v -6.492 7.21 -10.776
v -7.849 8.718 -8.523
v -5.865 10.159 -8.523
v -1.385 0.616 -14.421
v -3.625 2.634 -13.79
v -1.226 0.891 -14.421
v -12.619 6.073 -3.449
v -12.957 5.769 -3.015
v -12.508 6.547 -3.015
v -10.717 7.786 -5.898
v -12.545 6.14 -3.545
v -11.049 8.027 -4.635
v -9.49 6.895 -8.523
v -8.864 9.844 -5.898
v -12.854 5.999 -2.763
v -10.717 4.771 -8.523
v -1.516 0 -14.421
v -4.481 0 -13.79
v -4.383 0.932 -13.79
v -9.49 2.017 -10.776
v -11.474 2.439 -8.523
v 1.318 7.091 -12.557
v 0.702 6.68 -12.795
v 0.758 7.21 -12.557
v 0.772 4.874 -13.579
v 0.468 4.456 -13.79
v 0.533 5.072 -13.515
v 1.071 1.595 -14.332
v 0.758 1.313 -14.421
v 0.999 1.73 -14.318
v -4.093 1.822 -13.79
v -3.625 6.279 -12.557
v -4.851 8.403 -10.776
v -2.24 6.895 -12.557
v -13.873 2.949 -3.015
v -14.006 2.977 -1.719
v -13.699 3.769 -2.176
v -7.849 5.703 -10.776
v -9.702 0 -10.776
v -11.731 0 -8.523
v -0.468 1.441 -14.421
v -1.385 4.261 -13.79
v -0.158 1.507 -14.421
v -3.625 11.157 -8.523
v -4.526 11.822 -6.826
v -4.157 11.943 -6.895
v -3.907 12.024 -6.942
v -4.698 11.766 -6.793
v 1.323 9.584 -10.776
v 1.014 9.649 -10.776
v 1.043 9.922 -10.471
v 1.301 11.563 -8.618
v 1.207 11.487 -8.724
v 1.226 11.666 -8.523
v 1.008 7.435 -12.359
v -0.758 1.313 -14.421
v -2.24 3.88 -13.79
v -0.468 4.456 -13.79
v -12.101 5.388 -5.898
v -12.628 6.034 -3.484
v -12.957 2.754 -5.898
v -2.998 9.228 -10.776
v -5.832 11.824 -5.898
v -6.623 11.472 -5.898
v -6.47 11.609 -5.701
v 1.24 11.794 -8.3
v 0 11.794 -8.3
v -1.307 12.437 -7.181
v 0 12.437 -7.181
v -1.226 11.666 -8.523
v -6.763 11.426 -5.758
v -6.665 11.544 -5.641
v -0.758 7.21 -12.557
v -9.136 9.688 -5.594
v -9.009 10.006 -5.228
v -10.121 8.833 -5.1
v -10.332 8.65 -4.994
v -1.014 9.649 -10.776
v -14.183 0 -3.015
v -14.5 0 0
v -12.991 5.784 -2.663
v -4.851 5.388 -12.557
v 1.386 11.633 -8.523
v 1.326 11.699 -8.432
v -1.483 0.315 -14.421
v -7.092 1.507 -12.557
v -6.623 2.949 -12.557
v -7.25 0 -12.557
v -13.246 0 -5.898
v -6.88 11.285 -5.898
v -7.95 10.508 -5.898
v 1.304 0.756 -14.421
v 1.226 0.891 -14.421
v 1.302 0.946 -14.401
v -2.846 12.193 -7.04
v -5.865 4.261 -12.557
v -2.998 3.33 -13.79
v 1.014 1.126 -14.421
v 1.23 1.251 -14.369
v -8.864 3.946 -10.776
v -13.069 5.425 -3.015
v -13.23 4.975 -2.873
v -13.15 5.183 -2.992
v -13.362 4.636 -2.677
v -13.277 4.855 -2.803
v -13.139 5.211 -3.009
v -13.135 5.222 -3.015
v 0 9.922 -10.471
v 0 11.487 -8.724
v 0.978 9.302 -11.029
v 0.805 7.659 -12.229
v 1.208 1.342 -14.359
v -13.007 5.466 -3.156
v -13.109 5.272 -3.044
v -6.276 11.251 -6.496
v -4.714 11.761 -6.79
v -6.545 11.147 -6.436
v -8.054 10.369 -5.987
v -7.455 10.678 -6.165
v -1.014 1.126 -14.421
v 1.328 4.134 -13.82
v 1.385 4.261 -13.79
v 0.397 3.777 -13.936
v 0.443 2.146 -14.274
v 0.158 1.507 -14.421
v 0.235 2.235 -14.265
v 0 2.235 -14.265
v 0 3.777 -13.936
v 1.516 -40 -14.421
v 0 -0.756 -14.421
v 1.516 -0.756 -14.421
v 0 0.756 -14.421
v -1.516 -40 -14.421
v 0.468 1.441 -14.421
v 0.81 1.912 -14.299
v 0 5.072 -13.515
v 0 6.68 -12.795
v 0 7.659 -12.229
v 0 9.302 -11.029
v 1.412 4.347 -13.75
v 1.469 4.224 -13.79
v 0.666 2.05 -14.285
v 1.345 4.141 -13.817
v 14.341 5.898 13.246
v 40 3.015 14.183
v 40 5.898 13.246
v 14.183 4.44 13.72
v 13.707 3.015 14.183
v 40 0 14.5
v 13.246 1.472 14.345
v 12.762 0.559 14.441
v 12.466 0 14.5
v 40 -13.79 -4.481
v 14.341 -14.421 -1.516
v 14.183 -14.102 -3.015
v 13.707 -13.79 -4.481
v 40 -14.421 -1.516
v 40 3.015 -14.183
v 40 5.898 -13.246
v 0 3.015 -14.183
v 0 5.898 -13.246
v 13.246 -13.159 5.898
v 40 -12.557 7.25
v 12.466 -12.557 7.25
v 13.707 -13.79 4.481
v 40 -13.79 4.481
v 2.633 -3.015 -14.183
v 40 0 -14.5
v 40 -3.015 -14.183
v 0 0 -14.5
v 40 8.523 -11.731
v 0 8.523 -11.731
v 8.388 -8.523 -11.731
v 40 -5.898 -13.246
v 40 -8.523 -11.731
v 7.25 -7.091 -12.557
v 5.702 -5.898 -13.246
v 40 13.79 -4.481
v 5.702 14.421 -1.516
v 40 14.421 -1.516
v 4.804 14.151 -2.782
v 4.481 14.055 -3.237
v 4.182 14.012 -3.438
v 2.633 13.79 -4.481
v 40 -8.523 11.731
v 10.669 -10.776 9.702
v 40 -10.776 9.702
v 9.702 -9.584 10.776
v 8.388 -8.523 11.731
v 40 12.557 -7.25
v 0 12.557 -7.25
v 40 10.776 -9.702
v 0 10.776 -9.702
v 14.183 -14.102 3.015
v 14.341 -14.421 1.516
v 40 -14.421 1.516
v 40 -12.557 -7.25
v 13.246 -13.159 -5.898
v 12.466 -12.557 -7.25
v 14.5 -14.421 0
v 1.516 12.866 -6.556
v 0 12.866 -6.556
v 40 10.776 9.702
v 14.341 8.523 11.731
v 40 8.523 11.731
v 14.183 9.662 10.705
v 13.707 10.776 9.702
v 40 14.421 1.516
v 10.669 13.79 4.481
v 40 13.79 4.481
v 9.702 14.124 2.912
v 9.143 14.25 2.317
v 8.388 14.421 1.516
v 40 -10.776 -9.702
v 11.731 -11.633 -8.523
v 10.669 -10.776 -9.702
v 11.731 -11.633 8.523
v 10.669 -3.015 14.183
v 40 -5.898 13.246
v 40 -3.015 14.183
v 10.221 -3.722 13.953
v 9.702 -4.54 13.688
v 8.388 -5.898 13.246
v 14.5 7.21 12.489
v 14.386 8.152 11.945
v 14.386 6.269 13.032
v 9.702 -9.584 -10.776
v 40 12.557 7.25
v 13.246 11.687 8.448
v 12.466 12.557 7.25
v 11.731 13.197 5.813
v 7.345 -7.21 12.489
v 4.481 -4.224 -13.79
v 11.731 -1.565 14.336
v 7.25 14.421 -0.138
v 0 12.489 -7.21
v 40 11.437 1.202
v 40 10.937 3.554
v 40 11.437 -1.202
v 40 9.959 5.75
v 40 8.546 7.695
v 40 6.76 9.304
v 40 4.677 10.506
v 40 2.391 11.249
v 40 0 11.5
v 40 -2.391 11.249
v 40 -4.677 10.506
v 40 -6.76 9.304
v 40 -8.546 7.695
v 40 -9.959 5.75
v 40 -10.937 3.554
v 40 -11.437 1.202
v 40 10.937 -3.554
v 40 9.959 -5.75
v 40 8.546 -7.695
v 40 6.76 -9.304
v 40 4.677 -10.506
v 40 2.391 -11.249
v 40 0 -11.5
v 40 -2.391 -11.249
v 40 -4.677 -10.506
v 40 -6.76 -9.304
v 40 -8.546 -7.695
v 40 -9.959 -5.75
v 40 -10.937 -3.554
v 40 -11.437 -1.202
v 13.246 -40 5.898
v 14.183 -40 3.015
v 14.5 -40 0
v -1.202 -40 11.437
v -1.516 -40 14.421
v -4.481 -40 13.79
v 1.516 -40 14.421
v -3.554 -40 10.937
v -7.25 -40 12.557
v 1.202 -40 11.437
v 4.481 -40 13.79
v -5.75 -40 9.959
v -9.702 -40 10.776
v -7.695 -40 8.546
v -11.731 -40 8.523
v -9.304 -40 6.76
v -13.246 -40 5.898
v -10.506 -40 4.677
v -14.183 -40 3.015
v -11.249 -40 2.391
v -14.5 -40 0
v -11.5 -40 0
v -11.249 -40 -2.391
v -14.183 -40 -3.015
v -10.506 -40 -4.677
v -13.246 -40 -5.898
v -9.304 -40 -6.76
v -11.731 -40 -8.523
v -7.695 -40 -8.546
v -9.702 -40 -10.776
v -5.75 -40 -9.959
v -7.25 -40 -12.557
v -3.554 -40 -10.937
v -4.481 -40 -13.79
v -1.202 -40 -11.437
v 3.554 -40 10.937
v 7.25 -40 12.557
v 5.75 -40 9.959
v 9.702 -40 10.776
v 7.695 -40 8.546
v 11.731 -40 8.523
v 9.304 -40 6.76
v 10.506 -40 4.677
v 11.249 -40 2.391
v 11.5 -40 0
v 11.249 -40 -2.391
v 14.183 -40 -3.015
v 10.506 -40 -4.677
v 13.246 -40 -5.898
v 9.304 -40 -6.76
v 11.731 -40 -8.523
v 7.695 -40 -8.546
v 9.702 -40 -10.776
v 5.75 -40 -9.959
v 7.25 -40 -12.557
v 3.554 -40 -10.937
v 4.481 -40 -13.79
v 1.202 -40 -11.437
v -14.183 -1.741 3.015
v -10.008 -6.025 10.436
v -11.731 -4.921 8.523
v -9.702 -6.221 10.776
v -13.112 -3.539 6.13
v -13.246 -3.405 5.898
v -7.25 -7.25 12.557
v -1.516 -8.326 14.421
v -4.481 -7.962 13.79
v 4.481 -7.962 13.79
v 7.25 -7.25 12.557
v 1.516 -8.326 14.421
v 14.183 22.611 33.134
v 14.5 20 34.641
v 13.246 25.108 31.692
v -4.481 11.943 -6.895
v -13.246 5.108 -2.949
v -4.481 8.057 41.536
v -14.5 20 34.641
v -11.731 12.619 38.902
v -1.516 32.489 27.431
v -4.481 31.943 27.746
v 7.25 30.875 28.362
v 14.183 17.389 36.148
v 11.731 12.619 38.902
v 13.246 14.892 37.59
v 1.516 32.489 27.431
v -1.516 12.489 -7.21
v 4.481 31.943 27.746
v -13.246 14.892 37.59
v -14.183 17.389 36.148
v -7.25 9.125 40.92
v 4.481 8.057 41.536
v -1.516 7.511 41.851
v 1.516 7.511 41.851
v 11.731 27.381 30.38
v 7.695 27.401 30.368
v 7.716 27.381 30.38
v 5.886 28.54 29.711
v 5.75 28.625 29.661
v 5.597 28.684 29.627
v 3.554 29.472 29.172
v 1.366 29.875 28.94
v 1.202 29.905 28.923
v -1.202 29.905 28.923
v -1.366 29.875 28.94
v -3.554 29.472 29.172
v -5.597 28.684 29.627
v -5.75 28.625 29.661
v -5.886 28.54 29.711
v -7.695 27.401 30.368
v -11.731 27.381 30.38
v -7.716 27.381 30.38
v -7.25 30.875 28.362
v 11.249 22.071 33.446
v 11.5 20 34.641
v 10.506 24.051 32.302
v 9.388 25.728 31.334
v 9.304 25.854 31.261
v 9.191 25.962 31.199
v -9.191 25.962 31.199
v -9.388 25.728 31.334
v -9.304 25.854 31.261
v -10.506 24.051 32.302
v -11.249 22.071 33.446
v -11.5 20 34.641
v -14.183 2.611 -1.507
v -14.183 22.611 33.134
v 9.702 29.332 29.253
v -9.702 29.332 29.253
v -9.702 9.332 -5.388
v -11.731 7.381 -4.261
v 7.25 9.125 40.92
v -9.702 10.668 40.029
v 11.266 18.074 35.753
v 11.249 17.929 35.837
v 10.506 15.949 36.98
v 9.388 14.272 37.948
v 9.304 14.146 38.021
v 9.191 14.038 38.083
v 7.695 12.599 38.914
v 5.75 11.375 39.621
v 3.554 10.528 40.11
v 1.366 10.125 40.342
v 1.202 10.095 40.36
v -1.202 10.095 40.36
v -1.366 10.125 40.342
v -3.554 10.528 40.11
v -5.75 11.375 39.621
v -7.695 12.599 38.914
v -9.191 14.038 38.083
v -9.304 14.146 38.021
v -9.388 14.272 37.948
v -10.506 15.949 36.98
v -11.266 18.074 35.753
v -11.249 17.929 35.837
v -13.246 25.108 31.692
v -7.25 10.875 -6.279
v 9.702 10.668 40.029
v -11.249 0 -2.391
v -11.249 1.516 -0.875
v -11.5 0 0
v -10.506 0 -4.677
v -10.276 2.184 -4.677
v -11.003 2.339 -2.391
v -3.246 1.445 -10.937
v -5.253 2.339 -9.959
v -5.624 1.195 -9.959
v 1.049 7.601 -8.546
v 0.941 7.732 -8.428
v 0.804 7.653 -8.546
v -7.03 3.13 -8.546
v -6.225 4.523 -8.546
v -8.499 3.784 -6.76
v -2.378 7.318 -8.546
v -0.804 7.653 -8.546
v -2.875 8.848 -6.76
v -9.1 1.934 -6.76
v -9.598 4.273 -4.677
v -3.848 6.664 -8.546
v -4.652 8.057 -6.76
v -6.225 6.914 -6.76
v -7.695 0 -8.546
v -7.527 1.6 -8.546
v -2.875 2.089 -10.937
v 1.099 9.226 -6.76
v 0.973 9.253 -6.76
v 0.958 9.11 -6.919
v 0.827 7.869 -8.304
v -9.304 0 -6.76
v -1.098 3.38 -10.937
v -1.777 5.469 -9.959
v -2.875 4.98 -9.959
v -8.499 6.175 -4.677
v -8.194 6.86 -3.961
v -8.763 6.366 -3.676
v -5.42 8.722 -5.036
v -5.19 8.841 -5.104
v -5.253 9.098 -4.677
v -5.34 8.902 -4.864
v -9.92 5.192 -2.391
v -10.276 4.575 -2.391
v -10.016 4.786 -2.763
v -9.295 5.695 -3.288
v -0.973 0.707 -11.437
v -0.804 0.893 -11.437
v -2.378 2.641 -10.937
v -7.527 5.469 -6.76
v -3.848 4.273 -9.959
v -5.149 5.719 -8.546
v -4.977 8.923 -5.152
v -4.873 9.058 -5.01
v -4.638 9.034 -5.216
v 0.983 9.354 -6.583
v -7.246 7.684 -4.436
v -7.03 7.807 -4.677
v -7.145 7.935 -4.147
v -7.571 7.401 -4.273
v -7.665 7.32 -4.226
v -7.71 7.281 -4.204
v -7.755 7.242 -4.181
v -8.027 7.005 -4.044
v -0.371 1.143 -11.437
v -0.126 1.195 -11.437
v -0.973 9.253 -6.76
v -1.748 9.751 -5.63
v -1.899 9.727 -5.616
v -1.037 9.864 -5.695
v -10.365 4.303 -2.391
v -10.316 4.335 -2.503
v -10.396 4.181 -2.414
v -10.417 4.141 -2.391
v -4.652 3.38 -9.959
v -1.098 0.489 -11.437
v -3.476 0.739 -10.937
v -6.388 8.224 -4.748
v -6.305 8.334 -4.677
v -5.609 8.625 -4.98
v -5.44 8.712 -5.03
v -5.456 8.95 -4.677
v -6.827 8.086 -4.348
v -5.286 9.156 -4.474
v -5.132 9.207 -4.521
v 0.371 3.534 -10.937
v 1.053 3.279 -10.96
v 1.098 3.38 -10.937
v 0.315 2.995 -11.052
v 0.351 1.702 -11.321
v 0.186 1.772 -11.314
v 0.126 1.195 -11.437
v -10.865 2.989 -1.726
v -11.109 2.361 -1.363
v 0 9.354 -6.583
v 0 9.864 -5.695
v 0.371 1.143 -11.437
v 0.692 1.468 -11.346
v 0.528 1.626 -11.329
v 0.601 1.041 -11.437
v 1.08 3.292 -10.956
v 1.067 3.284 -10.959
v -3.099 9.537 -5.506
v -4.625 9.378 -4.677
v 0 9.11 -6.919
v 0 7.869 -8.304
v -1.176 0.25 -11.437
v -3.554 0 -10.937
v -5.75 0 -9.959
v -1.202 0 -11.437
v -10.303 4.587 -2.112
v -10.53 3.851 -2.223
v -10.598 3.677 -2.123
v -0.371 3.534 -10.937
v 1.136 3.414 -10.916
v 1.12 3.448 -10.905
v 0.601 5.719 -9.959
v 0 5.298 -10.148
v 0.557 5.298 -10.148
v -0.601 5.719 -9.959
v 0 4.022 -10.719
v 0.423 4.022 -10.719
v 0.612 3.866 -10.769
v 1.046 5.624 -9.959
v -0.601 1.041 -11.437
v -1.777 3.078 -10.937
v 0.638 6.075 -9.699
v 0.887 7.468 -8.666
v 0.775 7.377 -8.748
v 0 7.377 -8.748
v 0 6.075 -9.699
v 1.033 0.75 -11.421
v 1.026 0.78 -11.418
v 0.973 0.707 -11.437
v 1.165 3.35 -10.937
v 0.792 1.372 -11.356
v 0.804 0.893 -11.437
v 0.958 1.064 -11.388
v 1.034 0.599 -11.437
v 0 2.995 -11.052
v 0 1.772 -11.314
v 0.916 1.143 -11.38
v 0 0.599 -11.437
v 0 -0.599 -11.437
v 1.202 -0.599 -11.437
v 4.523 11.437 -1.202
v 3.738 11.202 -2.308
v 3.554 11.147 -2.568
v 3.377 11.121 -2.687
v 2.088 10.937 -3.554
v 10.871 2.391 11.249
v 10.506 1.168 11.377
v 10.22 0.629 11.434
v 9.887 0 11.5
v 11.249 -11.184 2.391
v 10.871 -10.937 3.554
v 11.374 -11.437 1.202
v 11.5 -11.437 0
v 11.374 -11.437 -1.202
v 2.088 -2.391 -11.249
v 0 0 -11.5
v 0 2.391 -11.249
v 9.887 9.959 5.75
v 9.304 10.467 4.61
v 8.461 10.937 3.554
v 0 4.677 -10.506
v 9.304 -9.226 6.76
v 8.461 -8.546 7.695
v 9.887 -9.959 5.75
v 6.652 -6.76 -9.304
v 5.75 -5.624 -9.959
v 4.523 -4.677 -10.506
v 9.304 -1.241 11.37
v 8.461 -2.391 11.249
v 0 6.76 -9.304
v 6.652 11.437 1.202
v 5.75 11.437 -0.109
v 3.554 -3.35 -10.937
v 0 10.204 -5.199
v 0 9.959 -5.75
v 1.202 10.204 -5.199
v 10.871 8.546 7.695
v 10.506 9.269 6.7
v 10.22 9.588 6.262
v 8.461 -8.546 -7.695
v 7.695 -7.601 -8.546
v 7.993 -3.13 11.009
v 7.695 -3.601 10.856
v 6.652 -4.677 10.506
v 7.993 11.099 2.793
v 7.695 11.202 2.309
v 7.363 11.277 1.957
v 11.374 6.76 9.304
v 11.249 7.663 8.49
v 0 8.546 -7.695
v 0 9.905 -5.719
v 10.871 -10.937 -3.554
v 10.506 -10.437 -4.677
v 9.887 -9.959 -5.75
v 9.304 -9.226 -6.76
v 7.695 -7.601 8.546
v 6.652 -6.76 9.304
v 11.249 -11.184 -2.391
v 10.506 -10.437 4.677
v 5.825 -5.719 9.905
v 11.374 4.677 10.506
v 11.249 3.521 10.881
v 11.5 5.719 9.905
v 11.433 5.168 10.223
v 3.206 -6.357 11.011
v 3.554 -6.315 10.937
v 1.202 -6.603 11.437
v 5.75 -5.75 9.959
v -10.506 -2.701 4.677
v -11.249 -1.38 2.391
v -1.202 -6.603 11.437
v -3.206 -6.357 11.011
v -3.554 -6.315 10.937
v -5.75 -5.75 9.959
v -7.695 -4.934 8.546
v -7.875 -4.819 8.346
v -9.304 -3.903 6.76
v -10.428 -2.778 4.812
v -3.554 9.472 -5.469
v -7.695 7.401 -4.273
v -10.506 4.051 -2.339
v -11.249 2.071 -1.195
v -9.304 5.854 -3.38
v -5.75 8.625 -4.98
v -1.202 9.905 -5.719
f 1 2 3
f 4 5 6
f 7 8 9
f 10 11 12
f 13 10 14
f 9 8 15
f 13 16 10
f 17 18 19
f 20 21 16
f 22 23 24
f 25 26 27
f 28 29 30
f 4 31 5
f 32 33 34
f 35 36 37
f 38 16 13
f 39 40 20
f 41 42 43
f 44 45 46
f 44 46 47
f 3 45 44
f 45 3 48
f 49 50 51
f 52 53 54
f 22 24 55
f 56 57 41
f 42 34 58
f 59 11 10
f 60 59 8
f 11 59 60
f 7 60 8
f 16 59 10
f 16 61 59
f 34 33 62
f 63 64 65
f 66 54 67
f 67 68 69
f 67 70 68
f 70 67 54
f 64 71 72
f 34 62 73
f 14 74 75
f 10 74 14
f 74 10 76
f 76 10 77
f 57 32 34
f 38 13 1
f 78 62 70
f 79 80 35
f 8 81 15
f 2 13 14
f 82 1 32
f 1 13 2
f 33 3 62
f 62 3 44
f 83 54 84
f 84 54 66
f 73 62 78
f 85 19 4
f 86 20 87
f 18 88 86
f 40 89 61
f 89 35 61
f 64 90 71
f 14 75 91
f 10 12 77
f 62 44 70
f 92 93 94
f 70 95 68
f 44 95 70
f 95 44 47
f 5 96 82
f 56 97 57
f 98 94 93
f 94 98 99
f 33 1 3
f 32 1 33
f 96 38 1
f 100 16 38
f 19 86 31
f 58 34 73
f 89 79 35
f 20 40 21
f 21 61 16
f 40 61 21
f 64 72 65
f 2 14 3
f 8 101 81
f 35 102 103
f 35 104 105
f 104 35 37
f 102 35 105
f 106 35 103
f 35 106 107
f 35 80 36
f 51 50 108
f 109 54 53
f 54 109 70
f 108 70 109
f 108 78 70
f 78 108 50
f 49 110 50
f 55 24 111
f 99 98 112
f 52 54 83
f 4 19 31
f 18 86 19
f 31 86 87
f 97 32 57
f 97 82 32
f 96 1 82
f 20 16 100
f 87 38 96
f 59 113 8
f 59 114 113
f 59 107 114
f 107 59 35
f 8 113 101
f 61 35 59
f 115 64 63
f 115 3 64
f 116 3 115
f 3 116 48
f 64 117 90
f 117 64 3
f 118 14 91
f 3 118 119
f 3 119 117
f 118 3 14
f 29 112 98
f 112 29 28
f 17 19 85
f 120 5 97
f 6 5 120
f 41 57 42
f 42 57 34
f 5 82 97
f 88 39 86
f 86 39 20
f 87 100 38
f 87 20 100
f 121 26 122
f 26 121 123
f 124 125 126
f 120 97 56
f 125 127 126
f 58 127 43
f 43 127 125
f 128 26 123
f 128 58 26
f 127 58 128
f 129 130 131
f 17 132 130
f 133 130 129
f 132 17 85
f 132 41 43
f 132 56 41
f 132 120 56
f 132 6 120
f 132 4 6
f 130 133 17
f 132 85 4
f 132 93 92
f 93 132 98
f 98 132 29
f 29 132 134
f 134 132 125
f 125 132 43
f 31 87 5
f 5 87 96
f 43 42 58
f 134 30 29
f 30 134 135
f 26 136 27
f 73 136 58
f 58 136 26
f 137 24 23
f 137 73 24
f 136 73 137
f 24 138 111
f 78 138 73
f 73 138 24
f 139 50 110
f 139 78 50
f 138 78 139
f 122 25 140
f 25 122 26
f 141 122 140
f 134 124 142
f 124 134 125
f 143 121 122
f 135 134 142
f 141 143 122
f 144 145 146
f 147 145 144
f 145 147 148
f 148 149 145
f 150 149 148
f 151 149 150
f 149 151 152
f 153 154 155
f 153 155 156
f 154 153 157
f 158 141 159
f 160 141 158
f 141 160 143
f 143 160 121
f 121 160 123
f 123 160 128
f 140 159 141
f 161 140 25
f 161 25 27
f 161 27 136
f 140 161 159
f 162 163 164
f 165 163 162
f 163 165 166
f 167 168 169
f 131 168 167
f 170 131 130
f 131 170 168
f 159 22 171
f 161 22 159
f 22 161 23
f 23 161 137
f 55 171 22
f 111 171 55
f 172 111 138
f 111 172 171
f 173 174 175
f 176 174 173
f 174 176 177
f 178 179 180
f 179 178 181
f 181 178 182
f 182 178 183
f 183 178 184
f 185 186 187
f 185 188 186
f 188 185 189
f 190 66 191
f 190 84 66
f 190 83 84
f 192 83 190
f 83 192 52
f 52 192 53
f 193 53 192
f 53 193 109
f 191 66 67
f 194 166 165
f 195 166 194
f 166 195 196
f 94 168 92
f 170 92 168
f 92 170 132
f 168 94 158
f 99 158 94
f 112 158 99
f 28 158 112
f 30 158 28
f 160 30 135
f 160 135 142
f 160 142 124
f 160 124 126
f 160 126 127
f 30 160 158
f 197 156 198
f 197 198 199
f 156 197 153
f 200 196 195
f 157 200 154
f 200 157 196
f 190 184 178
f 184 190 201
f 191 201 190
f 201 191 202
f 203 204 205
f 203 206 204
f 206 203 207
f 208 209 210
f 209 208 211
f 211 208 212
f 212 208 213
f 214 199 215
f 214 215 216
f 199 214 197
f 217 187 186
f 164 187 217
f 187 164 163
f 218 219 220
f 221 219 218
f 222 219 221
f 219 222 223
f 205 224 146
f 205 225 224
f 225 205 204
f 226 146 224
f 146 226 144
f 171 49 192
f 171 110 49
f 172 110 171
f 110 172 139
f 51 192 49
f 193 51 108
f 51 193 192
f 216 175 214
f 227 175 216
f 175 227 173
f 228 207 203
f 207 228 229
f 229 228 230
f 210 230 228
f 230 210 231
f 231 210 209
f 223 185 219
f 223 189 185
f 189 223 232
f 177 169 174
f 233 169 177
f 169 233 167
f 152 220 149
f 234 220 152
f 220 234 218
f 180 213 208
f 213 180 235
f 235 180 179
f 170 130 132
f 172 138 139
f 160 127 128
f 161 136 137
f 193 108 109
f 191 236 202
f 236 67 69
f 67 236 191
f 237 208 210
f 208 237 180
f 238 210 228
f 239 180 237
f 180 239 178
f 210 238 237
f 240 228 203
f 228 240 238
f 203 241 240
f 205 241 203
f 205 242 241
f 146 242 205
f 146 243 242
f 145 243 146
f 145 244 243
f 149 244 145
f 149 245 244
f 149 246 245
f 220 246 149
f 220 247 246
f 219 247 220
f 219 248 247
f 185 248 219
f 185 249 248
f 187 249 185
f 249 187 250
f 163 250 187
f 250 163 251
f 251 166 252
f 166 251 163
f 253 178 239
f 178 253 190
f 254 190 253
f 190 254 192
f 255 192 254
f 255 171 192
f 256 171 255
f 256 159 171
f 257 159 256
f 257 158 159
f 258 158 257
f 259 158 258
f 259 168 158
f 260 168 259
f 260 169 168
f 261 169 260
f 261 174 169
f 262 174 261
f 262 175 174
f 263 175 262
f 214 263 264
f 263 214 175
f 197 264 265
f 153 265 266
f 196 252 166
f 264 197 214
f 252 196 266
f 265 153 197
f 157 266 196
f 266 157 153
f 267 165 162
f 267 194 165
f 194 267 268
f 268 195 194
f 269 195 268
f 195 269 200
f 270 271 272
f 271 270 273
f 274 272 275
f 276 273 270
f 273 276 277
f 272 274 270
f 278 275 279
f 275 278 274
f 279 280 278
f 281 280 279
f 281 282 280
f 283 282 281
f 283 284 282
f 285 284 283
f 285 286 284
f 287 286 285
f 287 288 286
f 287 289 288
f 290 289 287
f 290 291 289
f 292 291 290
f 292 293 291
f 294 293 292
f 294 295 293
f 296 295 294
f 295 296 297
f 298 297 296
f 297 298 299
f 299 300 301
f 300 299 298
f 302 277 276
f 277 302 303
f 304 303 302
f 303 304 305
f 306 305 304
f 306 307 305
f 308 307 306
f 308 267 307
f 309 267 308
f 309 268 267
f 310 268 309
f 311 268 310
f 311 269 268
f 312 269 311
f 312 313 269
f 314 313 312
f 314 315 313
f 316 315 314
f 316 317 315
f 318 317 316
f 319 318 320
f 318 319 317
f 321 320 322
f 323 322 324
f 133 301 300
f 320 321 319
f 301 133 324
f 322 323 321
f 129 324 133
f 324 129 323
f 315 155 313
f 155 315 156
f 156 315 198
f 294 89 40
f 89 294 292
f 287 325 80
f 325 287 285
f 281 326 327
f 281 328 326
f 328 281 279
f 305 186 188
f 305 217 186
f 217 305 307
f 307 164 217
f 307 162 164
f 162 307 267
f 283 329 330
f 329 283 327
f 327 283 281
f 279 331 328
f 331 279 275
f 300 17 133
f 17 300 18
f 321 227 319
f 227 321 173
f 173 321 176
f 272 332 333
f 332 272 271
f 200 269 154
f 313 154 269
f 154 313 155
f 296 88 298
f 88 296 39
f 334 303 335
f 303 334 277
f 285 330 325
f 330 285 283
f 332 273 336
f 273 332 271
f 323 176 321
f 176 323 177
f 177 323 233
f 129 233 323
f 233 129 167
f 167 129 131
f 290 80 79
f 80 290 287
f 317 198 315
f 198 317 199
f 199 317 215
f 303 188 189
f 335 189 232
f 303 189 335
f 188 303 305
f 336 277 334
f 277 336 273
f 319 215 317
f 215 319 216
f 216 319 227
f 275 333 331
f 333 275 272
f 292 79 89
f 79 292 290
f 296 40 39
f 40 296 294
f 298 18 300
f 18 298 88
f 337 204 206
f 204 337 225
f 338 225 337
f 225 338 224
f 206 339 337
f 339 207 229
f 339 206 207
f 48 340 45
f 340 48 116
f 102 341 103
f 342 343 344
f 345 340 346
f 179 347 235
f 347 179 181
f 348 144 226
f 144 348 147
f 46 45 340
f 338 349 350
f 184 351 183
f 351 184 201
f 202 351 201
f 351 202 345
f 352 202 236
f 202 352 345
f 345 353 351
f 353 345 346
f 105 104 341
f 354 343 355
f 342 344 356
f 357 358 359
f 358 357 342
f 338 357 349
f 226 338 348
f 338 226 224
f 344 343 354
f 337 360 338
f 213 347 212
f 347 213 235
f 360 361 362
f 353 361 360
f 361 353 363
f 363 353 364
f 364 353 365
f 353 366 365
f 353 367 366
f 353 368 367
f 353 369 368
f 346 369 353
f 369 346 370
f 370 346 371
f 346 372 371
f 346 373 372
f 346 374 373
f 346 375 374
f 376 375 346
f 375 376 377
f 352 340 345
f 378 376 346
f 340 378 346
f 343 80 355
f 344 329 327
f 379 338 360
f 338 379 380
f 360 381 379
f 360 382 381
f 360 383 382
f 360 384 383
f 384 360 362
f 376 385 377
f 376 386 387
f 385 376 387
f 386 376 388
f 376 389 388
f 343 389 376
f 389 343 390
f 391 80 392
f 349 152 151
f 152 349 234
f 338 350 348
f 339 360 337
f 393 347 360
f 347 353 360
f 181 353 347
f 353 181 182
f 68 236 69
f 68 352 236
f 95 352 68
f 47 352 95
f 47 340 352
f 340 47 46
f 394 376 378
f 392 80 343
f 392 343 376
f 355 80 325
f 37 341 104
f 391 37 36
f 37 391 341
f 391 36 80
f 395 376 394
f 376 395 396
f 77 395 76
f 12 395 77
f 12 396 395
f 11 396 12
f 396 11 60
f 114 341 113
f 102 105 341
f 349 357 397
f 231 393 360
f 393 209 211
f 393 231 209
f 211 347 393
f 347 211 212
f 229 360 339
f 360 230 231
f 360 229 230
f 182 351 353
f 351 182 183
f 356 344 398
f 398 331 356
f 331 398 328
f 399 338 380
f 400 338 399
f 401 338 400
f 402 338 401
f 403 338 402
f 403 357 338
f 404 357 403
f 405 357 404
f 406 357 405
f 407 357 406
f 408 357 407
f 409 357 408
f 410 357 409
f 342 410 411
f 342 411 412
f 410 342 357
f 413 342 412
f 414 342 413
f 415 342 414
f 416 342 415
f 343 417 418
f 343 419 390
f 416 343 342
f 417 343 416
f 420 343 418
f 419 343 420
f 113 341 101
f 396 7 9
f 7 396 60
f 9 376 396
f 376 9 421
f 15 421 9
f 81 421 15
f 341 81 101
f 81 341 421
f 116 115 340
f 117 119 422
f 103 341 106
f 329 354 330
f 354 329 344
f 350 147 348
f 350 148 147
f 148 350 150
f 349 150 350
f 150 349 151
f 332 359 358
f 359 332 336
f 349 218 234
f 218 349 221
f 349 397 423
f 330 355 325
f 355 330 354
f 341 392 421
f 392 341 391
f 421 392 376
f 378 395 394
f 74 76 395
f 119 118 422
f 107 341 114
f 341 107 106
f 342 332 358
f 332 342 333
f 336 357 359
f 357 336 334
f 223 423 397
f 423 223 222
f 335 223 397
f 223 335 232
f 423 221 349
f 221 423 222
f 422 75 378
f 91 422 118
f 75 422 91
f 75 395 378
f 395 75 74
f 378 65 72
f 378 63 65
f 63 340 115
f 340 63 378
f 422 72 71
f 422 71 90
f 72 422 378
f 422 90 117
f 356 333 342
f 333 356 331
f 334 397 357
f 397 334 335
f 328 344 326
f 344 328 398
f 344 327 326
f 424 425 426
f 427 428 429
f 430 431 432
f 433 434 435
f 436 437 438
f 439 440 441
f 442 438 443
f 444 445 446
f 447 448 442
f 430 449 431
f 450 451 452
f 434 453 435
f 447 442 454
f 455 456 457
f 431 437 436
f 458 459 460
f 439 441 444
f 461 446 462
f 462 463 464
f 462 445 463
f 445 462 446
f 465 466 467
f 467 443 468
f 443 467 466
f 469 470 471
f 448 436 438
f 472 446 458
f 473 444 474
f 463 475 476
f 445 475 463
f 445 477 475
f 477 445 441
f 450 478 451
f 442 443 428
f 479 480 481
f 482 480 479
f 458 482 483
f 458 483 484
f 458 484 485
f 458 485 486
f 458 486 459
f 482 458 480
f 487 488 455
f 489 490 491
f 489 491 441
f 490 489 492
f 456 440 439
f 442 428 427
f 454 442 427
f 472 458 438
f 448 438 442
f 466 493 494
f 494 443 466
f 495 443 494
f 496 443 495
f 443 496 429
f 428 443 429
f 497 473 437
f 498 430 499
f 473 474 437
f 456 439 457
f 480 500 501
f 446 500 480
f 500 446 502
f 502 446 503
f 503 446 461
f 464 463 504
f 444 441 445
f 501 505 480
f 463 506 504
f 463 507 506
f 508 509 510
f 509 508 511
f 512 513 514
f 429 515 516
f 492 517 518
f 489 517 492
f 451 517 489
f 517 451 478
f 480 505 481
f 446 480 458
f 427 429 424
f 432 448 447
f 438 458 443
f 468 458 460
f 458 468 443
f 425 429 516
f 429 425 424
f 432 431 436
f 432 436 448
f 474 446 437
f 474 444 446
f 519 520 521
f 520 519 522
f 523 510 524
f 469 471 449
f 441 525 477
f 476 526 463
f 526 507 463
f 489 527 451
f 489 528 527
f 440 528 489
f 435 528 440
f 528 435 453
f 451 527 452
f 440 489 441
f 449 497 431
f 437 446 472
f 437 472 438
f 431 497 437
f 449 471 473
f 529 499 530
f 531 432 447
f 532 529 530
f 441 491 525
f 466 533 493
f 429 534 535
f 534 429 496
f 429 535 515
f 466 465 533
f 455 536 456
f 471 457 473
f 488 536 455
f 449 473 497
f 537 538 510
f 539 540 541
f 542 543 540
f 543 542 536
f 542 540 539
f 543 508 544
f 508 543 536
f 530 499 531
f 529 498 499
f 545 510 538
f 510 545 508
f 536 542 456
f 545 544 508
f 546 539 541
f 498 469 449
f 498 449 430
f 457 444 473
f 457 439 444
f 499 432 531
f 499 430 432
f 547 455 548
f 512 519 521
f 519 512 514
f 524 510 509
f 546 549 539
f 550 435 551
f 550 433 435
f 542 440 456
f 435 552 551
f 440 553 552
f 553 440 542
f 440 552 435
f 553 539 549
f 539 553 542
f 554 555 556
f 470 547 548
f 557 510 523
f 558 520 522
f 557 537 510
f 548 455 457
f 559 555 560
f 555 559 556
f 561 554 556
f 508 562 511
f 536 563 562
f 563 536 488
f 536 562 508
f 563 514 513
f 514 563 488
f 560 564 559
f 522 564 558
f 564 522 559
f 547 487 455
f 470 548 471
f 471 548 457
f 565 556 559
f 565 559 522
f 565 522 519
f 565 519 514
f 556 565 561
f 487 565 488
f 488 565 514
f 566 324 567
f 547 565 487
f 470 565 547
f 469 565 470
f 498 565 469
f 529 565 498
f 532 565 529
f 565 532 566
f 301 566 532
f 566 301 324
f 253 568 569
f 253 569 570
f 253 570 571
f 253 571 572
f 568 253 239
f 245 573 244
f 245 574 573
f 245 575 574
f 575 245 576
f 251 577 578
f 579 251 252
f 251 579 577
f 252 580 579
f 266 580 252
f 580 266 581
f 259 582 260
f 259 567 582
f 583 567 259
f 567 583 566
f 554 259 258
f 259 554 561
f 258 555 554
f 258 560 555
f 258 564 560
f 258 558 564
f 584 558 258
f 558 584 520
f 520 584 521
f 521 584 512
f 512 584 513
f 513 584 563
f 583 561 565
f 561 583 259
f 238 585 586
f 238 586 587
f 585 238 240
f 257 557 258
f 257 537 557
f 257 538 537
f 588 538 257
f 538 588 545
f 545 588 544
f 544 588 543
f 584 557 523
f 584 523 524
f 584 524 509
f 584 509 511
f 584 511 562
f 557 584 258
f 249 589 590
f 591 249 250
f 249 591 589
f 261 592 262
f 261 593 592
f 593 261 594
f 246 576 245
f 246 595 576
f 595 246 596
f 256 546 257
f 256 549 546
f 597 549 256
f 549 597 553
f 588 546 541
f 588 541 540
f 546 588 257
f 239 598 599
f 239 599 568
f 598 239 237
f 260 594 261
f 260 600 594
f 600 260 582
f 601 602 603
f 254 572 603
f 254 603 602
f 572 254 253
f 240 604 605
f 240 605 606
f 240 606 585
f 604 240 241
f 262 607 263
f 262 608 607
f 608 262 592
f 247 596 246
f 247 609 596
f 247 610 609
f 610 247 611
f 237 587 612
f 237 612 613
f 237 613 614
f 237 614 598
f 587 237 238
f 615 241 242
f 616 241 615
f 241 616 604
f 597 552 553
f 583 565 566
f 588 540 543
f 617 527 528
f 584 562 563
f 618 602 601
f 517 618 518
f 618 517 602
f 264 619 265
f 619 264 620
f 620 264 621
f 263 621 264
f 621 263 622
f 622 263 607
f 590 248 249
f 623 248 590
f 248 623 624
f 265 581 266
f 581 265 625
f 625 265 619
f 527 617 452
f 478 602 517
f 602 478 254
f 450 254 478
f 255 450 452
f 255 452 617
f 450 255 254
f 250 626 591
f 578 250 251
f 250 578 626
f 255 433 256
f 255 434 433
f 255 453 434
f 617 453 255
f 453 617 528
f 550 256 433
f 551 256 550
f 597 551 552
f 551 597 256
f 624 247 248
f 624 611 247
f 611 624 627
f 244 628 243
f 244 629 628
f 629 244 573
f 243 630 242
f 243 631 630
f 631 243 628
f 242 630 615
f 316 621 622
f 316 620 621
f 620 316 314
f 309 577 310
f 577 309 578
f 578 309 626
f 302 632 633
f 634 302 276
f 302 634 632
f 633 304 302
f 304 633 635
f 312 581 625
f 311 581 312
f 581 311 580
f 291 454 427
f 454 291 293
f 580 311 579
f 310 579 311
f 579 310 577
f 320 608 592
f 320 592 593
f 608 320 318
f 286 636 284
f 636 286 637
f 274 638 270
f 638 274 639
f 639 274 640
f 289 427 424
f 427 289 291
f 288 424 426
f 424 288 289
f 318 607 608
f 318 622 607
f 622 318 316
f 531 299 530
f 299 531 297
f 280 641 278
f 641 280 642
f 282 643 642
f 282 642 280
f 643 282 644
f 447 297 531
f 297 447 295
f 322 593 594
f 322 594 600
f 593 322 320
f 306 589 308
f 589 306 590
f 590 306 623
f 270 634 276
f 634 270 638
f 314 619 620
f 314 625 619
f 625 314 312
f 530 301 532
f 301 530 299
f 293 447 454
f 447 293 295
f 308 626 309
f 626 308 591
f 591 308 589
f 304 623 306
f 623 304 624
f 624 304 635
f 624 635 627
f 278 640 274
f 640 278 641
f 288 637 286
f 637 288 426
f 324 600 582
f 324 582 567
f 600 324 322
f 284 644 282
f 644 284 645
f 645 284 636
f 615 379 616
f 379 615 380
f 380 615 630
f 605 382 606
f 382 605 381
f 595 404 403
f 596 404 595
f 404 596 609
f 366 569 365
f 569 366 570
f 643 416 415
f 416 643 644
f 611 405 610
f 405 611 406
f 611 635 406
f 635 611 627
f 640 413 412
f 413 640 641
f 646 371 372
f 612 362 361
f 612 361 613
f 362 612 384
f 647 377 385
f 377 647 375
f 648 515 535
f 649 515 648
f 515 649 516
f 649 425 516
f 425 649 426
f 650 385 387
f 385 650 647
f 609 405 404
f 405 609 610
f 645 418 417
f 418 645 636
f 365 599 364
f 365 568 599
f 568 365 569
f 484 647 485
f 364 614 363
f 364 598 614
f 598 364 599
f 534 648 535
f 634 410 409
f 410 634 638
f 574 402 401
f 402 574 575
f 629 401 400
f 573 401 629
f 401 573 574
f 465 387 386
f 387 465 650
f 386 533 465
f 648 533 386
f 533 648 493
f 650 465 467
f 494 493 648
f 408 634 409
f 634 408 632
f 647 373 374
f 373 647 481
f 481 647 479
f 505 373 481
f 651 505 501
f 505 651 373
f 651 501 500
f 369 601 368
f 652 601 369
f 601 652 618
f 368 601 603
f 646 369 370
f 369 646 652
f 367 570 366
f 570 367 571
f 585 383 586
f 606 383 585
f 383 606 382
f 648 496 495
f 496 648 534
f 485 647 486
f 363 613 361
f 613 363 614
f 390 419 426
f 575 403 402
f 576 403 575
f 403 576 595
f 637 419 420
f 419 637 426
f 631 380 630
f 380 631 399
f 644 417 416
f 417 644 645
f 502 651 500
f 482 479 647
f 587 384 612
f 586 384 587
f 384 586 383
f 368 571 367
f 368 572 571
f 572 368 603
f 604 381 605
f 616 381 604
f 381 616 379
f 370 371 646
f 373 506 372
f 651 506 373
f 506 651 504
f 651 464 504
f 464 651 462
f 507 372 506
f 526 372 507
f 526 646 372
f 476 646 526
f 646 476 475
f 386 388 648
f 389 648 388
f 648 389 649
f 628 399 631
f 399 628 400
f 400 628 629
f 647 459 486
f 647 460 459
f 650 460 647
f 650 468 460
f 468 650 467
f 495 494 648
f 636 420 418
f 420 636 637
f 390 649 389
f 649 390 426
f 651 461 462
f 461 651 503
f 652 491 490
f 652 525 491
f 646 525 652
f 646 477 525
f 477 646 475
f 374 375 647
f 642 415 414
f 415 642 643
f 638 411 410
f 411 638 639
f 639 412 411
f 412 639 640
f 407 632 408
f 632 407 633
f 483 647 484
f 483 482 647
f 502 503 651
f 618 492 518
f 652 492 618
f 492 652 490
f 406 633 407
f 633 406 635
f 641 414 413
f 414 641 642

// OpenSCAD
// Inner diameter of the connector, in mm
inner_diameter = 23;
// Length of each cylinder, in mm
height = 40;
// Wall thickness, in mm
wall_thickness = 3;
// Connection angle, in degrees
angle = 120; // [1:180]

module connector(diameter, height, wall, angle) {
    module outer_cylinder(){ cylinder(r=diameter/2+wall, h=height); }
    module inner_cylinder(){ cylinder(r=diameter/2, h=height+wall); }
    
    difference() {
        union() { //outer cylinder
            sphere(diameter/2+wall);
            rotate([0, 90, 0]) outer_cylinder();
            rotate([90, 0, 0]) outer_cylinder();
            rotate([90-angle, 0, 0]) outer_cylinder();
        }
        
        union() { //inner cylinder
            sphere(diameter/2);
            rotate([0, 90, 0]) inner_cylinder();
            rotate([90, 0, 0]) inner_cylinder(); 
            rotate([90-angle, 0, 0]) inner_cylinder(); 
        }
    }

}



connector(diameter=inner_diameter,height=height,wall=wall_thickness,angle=angle);
